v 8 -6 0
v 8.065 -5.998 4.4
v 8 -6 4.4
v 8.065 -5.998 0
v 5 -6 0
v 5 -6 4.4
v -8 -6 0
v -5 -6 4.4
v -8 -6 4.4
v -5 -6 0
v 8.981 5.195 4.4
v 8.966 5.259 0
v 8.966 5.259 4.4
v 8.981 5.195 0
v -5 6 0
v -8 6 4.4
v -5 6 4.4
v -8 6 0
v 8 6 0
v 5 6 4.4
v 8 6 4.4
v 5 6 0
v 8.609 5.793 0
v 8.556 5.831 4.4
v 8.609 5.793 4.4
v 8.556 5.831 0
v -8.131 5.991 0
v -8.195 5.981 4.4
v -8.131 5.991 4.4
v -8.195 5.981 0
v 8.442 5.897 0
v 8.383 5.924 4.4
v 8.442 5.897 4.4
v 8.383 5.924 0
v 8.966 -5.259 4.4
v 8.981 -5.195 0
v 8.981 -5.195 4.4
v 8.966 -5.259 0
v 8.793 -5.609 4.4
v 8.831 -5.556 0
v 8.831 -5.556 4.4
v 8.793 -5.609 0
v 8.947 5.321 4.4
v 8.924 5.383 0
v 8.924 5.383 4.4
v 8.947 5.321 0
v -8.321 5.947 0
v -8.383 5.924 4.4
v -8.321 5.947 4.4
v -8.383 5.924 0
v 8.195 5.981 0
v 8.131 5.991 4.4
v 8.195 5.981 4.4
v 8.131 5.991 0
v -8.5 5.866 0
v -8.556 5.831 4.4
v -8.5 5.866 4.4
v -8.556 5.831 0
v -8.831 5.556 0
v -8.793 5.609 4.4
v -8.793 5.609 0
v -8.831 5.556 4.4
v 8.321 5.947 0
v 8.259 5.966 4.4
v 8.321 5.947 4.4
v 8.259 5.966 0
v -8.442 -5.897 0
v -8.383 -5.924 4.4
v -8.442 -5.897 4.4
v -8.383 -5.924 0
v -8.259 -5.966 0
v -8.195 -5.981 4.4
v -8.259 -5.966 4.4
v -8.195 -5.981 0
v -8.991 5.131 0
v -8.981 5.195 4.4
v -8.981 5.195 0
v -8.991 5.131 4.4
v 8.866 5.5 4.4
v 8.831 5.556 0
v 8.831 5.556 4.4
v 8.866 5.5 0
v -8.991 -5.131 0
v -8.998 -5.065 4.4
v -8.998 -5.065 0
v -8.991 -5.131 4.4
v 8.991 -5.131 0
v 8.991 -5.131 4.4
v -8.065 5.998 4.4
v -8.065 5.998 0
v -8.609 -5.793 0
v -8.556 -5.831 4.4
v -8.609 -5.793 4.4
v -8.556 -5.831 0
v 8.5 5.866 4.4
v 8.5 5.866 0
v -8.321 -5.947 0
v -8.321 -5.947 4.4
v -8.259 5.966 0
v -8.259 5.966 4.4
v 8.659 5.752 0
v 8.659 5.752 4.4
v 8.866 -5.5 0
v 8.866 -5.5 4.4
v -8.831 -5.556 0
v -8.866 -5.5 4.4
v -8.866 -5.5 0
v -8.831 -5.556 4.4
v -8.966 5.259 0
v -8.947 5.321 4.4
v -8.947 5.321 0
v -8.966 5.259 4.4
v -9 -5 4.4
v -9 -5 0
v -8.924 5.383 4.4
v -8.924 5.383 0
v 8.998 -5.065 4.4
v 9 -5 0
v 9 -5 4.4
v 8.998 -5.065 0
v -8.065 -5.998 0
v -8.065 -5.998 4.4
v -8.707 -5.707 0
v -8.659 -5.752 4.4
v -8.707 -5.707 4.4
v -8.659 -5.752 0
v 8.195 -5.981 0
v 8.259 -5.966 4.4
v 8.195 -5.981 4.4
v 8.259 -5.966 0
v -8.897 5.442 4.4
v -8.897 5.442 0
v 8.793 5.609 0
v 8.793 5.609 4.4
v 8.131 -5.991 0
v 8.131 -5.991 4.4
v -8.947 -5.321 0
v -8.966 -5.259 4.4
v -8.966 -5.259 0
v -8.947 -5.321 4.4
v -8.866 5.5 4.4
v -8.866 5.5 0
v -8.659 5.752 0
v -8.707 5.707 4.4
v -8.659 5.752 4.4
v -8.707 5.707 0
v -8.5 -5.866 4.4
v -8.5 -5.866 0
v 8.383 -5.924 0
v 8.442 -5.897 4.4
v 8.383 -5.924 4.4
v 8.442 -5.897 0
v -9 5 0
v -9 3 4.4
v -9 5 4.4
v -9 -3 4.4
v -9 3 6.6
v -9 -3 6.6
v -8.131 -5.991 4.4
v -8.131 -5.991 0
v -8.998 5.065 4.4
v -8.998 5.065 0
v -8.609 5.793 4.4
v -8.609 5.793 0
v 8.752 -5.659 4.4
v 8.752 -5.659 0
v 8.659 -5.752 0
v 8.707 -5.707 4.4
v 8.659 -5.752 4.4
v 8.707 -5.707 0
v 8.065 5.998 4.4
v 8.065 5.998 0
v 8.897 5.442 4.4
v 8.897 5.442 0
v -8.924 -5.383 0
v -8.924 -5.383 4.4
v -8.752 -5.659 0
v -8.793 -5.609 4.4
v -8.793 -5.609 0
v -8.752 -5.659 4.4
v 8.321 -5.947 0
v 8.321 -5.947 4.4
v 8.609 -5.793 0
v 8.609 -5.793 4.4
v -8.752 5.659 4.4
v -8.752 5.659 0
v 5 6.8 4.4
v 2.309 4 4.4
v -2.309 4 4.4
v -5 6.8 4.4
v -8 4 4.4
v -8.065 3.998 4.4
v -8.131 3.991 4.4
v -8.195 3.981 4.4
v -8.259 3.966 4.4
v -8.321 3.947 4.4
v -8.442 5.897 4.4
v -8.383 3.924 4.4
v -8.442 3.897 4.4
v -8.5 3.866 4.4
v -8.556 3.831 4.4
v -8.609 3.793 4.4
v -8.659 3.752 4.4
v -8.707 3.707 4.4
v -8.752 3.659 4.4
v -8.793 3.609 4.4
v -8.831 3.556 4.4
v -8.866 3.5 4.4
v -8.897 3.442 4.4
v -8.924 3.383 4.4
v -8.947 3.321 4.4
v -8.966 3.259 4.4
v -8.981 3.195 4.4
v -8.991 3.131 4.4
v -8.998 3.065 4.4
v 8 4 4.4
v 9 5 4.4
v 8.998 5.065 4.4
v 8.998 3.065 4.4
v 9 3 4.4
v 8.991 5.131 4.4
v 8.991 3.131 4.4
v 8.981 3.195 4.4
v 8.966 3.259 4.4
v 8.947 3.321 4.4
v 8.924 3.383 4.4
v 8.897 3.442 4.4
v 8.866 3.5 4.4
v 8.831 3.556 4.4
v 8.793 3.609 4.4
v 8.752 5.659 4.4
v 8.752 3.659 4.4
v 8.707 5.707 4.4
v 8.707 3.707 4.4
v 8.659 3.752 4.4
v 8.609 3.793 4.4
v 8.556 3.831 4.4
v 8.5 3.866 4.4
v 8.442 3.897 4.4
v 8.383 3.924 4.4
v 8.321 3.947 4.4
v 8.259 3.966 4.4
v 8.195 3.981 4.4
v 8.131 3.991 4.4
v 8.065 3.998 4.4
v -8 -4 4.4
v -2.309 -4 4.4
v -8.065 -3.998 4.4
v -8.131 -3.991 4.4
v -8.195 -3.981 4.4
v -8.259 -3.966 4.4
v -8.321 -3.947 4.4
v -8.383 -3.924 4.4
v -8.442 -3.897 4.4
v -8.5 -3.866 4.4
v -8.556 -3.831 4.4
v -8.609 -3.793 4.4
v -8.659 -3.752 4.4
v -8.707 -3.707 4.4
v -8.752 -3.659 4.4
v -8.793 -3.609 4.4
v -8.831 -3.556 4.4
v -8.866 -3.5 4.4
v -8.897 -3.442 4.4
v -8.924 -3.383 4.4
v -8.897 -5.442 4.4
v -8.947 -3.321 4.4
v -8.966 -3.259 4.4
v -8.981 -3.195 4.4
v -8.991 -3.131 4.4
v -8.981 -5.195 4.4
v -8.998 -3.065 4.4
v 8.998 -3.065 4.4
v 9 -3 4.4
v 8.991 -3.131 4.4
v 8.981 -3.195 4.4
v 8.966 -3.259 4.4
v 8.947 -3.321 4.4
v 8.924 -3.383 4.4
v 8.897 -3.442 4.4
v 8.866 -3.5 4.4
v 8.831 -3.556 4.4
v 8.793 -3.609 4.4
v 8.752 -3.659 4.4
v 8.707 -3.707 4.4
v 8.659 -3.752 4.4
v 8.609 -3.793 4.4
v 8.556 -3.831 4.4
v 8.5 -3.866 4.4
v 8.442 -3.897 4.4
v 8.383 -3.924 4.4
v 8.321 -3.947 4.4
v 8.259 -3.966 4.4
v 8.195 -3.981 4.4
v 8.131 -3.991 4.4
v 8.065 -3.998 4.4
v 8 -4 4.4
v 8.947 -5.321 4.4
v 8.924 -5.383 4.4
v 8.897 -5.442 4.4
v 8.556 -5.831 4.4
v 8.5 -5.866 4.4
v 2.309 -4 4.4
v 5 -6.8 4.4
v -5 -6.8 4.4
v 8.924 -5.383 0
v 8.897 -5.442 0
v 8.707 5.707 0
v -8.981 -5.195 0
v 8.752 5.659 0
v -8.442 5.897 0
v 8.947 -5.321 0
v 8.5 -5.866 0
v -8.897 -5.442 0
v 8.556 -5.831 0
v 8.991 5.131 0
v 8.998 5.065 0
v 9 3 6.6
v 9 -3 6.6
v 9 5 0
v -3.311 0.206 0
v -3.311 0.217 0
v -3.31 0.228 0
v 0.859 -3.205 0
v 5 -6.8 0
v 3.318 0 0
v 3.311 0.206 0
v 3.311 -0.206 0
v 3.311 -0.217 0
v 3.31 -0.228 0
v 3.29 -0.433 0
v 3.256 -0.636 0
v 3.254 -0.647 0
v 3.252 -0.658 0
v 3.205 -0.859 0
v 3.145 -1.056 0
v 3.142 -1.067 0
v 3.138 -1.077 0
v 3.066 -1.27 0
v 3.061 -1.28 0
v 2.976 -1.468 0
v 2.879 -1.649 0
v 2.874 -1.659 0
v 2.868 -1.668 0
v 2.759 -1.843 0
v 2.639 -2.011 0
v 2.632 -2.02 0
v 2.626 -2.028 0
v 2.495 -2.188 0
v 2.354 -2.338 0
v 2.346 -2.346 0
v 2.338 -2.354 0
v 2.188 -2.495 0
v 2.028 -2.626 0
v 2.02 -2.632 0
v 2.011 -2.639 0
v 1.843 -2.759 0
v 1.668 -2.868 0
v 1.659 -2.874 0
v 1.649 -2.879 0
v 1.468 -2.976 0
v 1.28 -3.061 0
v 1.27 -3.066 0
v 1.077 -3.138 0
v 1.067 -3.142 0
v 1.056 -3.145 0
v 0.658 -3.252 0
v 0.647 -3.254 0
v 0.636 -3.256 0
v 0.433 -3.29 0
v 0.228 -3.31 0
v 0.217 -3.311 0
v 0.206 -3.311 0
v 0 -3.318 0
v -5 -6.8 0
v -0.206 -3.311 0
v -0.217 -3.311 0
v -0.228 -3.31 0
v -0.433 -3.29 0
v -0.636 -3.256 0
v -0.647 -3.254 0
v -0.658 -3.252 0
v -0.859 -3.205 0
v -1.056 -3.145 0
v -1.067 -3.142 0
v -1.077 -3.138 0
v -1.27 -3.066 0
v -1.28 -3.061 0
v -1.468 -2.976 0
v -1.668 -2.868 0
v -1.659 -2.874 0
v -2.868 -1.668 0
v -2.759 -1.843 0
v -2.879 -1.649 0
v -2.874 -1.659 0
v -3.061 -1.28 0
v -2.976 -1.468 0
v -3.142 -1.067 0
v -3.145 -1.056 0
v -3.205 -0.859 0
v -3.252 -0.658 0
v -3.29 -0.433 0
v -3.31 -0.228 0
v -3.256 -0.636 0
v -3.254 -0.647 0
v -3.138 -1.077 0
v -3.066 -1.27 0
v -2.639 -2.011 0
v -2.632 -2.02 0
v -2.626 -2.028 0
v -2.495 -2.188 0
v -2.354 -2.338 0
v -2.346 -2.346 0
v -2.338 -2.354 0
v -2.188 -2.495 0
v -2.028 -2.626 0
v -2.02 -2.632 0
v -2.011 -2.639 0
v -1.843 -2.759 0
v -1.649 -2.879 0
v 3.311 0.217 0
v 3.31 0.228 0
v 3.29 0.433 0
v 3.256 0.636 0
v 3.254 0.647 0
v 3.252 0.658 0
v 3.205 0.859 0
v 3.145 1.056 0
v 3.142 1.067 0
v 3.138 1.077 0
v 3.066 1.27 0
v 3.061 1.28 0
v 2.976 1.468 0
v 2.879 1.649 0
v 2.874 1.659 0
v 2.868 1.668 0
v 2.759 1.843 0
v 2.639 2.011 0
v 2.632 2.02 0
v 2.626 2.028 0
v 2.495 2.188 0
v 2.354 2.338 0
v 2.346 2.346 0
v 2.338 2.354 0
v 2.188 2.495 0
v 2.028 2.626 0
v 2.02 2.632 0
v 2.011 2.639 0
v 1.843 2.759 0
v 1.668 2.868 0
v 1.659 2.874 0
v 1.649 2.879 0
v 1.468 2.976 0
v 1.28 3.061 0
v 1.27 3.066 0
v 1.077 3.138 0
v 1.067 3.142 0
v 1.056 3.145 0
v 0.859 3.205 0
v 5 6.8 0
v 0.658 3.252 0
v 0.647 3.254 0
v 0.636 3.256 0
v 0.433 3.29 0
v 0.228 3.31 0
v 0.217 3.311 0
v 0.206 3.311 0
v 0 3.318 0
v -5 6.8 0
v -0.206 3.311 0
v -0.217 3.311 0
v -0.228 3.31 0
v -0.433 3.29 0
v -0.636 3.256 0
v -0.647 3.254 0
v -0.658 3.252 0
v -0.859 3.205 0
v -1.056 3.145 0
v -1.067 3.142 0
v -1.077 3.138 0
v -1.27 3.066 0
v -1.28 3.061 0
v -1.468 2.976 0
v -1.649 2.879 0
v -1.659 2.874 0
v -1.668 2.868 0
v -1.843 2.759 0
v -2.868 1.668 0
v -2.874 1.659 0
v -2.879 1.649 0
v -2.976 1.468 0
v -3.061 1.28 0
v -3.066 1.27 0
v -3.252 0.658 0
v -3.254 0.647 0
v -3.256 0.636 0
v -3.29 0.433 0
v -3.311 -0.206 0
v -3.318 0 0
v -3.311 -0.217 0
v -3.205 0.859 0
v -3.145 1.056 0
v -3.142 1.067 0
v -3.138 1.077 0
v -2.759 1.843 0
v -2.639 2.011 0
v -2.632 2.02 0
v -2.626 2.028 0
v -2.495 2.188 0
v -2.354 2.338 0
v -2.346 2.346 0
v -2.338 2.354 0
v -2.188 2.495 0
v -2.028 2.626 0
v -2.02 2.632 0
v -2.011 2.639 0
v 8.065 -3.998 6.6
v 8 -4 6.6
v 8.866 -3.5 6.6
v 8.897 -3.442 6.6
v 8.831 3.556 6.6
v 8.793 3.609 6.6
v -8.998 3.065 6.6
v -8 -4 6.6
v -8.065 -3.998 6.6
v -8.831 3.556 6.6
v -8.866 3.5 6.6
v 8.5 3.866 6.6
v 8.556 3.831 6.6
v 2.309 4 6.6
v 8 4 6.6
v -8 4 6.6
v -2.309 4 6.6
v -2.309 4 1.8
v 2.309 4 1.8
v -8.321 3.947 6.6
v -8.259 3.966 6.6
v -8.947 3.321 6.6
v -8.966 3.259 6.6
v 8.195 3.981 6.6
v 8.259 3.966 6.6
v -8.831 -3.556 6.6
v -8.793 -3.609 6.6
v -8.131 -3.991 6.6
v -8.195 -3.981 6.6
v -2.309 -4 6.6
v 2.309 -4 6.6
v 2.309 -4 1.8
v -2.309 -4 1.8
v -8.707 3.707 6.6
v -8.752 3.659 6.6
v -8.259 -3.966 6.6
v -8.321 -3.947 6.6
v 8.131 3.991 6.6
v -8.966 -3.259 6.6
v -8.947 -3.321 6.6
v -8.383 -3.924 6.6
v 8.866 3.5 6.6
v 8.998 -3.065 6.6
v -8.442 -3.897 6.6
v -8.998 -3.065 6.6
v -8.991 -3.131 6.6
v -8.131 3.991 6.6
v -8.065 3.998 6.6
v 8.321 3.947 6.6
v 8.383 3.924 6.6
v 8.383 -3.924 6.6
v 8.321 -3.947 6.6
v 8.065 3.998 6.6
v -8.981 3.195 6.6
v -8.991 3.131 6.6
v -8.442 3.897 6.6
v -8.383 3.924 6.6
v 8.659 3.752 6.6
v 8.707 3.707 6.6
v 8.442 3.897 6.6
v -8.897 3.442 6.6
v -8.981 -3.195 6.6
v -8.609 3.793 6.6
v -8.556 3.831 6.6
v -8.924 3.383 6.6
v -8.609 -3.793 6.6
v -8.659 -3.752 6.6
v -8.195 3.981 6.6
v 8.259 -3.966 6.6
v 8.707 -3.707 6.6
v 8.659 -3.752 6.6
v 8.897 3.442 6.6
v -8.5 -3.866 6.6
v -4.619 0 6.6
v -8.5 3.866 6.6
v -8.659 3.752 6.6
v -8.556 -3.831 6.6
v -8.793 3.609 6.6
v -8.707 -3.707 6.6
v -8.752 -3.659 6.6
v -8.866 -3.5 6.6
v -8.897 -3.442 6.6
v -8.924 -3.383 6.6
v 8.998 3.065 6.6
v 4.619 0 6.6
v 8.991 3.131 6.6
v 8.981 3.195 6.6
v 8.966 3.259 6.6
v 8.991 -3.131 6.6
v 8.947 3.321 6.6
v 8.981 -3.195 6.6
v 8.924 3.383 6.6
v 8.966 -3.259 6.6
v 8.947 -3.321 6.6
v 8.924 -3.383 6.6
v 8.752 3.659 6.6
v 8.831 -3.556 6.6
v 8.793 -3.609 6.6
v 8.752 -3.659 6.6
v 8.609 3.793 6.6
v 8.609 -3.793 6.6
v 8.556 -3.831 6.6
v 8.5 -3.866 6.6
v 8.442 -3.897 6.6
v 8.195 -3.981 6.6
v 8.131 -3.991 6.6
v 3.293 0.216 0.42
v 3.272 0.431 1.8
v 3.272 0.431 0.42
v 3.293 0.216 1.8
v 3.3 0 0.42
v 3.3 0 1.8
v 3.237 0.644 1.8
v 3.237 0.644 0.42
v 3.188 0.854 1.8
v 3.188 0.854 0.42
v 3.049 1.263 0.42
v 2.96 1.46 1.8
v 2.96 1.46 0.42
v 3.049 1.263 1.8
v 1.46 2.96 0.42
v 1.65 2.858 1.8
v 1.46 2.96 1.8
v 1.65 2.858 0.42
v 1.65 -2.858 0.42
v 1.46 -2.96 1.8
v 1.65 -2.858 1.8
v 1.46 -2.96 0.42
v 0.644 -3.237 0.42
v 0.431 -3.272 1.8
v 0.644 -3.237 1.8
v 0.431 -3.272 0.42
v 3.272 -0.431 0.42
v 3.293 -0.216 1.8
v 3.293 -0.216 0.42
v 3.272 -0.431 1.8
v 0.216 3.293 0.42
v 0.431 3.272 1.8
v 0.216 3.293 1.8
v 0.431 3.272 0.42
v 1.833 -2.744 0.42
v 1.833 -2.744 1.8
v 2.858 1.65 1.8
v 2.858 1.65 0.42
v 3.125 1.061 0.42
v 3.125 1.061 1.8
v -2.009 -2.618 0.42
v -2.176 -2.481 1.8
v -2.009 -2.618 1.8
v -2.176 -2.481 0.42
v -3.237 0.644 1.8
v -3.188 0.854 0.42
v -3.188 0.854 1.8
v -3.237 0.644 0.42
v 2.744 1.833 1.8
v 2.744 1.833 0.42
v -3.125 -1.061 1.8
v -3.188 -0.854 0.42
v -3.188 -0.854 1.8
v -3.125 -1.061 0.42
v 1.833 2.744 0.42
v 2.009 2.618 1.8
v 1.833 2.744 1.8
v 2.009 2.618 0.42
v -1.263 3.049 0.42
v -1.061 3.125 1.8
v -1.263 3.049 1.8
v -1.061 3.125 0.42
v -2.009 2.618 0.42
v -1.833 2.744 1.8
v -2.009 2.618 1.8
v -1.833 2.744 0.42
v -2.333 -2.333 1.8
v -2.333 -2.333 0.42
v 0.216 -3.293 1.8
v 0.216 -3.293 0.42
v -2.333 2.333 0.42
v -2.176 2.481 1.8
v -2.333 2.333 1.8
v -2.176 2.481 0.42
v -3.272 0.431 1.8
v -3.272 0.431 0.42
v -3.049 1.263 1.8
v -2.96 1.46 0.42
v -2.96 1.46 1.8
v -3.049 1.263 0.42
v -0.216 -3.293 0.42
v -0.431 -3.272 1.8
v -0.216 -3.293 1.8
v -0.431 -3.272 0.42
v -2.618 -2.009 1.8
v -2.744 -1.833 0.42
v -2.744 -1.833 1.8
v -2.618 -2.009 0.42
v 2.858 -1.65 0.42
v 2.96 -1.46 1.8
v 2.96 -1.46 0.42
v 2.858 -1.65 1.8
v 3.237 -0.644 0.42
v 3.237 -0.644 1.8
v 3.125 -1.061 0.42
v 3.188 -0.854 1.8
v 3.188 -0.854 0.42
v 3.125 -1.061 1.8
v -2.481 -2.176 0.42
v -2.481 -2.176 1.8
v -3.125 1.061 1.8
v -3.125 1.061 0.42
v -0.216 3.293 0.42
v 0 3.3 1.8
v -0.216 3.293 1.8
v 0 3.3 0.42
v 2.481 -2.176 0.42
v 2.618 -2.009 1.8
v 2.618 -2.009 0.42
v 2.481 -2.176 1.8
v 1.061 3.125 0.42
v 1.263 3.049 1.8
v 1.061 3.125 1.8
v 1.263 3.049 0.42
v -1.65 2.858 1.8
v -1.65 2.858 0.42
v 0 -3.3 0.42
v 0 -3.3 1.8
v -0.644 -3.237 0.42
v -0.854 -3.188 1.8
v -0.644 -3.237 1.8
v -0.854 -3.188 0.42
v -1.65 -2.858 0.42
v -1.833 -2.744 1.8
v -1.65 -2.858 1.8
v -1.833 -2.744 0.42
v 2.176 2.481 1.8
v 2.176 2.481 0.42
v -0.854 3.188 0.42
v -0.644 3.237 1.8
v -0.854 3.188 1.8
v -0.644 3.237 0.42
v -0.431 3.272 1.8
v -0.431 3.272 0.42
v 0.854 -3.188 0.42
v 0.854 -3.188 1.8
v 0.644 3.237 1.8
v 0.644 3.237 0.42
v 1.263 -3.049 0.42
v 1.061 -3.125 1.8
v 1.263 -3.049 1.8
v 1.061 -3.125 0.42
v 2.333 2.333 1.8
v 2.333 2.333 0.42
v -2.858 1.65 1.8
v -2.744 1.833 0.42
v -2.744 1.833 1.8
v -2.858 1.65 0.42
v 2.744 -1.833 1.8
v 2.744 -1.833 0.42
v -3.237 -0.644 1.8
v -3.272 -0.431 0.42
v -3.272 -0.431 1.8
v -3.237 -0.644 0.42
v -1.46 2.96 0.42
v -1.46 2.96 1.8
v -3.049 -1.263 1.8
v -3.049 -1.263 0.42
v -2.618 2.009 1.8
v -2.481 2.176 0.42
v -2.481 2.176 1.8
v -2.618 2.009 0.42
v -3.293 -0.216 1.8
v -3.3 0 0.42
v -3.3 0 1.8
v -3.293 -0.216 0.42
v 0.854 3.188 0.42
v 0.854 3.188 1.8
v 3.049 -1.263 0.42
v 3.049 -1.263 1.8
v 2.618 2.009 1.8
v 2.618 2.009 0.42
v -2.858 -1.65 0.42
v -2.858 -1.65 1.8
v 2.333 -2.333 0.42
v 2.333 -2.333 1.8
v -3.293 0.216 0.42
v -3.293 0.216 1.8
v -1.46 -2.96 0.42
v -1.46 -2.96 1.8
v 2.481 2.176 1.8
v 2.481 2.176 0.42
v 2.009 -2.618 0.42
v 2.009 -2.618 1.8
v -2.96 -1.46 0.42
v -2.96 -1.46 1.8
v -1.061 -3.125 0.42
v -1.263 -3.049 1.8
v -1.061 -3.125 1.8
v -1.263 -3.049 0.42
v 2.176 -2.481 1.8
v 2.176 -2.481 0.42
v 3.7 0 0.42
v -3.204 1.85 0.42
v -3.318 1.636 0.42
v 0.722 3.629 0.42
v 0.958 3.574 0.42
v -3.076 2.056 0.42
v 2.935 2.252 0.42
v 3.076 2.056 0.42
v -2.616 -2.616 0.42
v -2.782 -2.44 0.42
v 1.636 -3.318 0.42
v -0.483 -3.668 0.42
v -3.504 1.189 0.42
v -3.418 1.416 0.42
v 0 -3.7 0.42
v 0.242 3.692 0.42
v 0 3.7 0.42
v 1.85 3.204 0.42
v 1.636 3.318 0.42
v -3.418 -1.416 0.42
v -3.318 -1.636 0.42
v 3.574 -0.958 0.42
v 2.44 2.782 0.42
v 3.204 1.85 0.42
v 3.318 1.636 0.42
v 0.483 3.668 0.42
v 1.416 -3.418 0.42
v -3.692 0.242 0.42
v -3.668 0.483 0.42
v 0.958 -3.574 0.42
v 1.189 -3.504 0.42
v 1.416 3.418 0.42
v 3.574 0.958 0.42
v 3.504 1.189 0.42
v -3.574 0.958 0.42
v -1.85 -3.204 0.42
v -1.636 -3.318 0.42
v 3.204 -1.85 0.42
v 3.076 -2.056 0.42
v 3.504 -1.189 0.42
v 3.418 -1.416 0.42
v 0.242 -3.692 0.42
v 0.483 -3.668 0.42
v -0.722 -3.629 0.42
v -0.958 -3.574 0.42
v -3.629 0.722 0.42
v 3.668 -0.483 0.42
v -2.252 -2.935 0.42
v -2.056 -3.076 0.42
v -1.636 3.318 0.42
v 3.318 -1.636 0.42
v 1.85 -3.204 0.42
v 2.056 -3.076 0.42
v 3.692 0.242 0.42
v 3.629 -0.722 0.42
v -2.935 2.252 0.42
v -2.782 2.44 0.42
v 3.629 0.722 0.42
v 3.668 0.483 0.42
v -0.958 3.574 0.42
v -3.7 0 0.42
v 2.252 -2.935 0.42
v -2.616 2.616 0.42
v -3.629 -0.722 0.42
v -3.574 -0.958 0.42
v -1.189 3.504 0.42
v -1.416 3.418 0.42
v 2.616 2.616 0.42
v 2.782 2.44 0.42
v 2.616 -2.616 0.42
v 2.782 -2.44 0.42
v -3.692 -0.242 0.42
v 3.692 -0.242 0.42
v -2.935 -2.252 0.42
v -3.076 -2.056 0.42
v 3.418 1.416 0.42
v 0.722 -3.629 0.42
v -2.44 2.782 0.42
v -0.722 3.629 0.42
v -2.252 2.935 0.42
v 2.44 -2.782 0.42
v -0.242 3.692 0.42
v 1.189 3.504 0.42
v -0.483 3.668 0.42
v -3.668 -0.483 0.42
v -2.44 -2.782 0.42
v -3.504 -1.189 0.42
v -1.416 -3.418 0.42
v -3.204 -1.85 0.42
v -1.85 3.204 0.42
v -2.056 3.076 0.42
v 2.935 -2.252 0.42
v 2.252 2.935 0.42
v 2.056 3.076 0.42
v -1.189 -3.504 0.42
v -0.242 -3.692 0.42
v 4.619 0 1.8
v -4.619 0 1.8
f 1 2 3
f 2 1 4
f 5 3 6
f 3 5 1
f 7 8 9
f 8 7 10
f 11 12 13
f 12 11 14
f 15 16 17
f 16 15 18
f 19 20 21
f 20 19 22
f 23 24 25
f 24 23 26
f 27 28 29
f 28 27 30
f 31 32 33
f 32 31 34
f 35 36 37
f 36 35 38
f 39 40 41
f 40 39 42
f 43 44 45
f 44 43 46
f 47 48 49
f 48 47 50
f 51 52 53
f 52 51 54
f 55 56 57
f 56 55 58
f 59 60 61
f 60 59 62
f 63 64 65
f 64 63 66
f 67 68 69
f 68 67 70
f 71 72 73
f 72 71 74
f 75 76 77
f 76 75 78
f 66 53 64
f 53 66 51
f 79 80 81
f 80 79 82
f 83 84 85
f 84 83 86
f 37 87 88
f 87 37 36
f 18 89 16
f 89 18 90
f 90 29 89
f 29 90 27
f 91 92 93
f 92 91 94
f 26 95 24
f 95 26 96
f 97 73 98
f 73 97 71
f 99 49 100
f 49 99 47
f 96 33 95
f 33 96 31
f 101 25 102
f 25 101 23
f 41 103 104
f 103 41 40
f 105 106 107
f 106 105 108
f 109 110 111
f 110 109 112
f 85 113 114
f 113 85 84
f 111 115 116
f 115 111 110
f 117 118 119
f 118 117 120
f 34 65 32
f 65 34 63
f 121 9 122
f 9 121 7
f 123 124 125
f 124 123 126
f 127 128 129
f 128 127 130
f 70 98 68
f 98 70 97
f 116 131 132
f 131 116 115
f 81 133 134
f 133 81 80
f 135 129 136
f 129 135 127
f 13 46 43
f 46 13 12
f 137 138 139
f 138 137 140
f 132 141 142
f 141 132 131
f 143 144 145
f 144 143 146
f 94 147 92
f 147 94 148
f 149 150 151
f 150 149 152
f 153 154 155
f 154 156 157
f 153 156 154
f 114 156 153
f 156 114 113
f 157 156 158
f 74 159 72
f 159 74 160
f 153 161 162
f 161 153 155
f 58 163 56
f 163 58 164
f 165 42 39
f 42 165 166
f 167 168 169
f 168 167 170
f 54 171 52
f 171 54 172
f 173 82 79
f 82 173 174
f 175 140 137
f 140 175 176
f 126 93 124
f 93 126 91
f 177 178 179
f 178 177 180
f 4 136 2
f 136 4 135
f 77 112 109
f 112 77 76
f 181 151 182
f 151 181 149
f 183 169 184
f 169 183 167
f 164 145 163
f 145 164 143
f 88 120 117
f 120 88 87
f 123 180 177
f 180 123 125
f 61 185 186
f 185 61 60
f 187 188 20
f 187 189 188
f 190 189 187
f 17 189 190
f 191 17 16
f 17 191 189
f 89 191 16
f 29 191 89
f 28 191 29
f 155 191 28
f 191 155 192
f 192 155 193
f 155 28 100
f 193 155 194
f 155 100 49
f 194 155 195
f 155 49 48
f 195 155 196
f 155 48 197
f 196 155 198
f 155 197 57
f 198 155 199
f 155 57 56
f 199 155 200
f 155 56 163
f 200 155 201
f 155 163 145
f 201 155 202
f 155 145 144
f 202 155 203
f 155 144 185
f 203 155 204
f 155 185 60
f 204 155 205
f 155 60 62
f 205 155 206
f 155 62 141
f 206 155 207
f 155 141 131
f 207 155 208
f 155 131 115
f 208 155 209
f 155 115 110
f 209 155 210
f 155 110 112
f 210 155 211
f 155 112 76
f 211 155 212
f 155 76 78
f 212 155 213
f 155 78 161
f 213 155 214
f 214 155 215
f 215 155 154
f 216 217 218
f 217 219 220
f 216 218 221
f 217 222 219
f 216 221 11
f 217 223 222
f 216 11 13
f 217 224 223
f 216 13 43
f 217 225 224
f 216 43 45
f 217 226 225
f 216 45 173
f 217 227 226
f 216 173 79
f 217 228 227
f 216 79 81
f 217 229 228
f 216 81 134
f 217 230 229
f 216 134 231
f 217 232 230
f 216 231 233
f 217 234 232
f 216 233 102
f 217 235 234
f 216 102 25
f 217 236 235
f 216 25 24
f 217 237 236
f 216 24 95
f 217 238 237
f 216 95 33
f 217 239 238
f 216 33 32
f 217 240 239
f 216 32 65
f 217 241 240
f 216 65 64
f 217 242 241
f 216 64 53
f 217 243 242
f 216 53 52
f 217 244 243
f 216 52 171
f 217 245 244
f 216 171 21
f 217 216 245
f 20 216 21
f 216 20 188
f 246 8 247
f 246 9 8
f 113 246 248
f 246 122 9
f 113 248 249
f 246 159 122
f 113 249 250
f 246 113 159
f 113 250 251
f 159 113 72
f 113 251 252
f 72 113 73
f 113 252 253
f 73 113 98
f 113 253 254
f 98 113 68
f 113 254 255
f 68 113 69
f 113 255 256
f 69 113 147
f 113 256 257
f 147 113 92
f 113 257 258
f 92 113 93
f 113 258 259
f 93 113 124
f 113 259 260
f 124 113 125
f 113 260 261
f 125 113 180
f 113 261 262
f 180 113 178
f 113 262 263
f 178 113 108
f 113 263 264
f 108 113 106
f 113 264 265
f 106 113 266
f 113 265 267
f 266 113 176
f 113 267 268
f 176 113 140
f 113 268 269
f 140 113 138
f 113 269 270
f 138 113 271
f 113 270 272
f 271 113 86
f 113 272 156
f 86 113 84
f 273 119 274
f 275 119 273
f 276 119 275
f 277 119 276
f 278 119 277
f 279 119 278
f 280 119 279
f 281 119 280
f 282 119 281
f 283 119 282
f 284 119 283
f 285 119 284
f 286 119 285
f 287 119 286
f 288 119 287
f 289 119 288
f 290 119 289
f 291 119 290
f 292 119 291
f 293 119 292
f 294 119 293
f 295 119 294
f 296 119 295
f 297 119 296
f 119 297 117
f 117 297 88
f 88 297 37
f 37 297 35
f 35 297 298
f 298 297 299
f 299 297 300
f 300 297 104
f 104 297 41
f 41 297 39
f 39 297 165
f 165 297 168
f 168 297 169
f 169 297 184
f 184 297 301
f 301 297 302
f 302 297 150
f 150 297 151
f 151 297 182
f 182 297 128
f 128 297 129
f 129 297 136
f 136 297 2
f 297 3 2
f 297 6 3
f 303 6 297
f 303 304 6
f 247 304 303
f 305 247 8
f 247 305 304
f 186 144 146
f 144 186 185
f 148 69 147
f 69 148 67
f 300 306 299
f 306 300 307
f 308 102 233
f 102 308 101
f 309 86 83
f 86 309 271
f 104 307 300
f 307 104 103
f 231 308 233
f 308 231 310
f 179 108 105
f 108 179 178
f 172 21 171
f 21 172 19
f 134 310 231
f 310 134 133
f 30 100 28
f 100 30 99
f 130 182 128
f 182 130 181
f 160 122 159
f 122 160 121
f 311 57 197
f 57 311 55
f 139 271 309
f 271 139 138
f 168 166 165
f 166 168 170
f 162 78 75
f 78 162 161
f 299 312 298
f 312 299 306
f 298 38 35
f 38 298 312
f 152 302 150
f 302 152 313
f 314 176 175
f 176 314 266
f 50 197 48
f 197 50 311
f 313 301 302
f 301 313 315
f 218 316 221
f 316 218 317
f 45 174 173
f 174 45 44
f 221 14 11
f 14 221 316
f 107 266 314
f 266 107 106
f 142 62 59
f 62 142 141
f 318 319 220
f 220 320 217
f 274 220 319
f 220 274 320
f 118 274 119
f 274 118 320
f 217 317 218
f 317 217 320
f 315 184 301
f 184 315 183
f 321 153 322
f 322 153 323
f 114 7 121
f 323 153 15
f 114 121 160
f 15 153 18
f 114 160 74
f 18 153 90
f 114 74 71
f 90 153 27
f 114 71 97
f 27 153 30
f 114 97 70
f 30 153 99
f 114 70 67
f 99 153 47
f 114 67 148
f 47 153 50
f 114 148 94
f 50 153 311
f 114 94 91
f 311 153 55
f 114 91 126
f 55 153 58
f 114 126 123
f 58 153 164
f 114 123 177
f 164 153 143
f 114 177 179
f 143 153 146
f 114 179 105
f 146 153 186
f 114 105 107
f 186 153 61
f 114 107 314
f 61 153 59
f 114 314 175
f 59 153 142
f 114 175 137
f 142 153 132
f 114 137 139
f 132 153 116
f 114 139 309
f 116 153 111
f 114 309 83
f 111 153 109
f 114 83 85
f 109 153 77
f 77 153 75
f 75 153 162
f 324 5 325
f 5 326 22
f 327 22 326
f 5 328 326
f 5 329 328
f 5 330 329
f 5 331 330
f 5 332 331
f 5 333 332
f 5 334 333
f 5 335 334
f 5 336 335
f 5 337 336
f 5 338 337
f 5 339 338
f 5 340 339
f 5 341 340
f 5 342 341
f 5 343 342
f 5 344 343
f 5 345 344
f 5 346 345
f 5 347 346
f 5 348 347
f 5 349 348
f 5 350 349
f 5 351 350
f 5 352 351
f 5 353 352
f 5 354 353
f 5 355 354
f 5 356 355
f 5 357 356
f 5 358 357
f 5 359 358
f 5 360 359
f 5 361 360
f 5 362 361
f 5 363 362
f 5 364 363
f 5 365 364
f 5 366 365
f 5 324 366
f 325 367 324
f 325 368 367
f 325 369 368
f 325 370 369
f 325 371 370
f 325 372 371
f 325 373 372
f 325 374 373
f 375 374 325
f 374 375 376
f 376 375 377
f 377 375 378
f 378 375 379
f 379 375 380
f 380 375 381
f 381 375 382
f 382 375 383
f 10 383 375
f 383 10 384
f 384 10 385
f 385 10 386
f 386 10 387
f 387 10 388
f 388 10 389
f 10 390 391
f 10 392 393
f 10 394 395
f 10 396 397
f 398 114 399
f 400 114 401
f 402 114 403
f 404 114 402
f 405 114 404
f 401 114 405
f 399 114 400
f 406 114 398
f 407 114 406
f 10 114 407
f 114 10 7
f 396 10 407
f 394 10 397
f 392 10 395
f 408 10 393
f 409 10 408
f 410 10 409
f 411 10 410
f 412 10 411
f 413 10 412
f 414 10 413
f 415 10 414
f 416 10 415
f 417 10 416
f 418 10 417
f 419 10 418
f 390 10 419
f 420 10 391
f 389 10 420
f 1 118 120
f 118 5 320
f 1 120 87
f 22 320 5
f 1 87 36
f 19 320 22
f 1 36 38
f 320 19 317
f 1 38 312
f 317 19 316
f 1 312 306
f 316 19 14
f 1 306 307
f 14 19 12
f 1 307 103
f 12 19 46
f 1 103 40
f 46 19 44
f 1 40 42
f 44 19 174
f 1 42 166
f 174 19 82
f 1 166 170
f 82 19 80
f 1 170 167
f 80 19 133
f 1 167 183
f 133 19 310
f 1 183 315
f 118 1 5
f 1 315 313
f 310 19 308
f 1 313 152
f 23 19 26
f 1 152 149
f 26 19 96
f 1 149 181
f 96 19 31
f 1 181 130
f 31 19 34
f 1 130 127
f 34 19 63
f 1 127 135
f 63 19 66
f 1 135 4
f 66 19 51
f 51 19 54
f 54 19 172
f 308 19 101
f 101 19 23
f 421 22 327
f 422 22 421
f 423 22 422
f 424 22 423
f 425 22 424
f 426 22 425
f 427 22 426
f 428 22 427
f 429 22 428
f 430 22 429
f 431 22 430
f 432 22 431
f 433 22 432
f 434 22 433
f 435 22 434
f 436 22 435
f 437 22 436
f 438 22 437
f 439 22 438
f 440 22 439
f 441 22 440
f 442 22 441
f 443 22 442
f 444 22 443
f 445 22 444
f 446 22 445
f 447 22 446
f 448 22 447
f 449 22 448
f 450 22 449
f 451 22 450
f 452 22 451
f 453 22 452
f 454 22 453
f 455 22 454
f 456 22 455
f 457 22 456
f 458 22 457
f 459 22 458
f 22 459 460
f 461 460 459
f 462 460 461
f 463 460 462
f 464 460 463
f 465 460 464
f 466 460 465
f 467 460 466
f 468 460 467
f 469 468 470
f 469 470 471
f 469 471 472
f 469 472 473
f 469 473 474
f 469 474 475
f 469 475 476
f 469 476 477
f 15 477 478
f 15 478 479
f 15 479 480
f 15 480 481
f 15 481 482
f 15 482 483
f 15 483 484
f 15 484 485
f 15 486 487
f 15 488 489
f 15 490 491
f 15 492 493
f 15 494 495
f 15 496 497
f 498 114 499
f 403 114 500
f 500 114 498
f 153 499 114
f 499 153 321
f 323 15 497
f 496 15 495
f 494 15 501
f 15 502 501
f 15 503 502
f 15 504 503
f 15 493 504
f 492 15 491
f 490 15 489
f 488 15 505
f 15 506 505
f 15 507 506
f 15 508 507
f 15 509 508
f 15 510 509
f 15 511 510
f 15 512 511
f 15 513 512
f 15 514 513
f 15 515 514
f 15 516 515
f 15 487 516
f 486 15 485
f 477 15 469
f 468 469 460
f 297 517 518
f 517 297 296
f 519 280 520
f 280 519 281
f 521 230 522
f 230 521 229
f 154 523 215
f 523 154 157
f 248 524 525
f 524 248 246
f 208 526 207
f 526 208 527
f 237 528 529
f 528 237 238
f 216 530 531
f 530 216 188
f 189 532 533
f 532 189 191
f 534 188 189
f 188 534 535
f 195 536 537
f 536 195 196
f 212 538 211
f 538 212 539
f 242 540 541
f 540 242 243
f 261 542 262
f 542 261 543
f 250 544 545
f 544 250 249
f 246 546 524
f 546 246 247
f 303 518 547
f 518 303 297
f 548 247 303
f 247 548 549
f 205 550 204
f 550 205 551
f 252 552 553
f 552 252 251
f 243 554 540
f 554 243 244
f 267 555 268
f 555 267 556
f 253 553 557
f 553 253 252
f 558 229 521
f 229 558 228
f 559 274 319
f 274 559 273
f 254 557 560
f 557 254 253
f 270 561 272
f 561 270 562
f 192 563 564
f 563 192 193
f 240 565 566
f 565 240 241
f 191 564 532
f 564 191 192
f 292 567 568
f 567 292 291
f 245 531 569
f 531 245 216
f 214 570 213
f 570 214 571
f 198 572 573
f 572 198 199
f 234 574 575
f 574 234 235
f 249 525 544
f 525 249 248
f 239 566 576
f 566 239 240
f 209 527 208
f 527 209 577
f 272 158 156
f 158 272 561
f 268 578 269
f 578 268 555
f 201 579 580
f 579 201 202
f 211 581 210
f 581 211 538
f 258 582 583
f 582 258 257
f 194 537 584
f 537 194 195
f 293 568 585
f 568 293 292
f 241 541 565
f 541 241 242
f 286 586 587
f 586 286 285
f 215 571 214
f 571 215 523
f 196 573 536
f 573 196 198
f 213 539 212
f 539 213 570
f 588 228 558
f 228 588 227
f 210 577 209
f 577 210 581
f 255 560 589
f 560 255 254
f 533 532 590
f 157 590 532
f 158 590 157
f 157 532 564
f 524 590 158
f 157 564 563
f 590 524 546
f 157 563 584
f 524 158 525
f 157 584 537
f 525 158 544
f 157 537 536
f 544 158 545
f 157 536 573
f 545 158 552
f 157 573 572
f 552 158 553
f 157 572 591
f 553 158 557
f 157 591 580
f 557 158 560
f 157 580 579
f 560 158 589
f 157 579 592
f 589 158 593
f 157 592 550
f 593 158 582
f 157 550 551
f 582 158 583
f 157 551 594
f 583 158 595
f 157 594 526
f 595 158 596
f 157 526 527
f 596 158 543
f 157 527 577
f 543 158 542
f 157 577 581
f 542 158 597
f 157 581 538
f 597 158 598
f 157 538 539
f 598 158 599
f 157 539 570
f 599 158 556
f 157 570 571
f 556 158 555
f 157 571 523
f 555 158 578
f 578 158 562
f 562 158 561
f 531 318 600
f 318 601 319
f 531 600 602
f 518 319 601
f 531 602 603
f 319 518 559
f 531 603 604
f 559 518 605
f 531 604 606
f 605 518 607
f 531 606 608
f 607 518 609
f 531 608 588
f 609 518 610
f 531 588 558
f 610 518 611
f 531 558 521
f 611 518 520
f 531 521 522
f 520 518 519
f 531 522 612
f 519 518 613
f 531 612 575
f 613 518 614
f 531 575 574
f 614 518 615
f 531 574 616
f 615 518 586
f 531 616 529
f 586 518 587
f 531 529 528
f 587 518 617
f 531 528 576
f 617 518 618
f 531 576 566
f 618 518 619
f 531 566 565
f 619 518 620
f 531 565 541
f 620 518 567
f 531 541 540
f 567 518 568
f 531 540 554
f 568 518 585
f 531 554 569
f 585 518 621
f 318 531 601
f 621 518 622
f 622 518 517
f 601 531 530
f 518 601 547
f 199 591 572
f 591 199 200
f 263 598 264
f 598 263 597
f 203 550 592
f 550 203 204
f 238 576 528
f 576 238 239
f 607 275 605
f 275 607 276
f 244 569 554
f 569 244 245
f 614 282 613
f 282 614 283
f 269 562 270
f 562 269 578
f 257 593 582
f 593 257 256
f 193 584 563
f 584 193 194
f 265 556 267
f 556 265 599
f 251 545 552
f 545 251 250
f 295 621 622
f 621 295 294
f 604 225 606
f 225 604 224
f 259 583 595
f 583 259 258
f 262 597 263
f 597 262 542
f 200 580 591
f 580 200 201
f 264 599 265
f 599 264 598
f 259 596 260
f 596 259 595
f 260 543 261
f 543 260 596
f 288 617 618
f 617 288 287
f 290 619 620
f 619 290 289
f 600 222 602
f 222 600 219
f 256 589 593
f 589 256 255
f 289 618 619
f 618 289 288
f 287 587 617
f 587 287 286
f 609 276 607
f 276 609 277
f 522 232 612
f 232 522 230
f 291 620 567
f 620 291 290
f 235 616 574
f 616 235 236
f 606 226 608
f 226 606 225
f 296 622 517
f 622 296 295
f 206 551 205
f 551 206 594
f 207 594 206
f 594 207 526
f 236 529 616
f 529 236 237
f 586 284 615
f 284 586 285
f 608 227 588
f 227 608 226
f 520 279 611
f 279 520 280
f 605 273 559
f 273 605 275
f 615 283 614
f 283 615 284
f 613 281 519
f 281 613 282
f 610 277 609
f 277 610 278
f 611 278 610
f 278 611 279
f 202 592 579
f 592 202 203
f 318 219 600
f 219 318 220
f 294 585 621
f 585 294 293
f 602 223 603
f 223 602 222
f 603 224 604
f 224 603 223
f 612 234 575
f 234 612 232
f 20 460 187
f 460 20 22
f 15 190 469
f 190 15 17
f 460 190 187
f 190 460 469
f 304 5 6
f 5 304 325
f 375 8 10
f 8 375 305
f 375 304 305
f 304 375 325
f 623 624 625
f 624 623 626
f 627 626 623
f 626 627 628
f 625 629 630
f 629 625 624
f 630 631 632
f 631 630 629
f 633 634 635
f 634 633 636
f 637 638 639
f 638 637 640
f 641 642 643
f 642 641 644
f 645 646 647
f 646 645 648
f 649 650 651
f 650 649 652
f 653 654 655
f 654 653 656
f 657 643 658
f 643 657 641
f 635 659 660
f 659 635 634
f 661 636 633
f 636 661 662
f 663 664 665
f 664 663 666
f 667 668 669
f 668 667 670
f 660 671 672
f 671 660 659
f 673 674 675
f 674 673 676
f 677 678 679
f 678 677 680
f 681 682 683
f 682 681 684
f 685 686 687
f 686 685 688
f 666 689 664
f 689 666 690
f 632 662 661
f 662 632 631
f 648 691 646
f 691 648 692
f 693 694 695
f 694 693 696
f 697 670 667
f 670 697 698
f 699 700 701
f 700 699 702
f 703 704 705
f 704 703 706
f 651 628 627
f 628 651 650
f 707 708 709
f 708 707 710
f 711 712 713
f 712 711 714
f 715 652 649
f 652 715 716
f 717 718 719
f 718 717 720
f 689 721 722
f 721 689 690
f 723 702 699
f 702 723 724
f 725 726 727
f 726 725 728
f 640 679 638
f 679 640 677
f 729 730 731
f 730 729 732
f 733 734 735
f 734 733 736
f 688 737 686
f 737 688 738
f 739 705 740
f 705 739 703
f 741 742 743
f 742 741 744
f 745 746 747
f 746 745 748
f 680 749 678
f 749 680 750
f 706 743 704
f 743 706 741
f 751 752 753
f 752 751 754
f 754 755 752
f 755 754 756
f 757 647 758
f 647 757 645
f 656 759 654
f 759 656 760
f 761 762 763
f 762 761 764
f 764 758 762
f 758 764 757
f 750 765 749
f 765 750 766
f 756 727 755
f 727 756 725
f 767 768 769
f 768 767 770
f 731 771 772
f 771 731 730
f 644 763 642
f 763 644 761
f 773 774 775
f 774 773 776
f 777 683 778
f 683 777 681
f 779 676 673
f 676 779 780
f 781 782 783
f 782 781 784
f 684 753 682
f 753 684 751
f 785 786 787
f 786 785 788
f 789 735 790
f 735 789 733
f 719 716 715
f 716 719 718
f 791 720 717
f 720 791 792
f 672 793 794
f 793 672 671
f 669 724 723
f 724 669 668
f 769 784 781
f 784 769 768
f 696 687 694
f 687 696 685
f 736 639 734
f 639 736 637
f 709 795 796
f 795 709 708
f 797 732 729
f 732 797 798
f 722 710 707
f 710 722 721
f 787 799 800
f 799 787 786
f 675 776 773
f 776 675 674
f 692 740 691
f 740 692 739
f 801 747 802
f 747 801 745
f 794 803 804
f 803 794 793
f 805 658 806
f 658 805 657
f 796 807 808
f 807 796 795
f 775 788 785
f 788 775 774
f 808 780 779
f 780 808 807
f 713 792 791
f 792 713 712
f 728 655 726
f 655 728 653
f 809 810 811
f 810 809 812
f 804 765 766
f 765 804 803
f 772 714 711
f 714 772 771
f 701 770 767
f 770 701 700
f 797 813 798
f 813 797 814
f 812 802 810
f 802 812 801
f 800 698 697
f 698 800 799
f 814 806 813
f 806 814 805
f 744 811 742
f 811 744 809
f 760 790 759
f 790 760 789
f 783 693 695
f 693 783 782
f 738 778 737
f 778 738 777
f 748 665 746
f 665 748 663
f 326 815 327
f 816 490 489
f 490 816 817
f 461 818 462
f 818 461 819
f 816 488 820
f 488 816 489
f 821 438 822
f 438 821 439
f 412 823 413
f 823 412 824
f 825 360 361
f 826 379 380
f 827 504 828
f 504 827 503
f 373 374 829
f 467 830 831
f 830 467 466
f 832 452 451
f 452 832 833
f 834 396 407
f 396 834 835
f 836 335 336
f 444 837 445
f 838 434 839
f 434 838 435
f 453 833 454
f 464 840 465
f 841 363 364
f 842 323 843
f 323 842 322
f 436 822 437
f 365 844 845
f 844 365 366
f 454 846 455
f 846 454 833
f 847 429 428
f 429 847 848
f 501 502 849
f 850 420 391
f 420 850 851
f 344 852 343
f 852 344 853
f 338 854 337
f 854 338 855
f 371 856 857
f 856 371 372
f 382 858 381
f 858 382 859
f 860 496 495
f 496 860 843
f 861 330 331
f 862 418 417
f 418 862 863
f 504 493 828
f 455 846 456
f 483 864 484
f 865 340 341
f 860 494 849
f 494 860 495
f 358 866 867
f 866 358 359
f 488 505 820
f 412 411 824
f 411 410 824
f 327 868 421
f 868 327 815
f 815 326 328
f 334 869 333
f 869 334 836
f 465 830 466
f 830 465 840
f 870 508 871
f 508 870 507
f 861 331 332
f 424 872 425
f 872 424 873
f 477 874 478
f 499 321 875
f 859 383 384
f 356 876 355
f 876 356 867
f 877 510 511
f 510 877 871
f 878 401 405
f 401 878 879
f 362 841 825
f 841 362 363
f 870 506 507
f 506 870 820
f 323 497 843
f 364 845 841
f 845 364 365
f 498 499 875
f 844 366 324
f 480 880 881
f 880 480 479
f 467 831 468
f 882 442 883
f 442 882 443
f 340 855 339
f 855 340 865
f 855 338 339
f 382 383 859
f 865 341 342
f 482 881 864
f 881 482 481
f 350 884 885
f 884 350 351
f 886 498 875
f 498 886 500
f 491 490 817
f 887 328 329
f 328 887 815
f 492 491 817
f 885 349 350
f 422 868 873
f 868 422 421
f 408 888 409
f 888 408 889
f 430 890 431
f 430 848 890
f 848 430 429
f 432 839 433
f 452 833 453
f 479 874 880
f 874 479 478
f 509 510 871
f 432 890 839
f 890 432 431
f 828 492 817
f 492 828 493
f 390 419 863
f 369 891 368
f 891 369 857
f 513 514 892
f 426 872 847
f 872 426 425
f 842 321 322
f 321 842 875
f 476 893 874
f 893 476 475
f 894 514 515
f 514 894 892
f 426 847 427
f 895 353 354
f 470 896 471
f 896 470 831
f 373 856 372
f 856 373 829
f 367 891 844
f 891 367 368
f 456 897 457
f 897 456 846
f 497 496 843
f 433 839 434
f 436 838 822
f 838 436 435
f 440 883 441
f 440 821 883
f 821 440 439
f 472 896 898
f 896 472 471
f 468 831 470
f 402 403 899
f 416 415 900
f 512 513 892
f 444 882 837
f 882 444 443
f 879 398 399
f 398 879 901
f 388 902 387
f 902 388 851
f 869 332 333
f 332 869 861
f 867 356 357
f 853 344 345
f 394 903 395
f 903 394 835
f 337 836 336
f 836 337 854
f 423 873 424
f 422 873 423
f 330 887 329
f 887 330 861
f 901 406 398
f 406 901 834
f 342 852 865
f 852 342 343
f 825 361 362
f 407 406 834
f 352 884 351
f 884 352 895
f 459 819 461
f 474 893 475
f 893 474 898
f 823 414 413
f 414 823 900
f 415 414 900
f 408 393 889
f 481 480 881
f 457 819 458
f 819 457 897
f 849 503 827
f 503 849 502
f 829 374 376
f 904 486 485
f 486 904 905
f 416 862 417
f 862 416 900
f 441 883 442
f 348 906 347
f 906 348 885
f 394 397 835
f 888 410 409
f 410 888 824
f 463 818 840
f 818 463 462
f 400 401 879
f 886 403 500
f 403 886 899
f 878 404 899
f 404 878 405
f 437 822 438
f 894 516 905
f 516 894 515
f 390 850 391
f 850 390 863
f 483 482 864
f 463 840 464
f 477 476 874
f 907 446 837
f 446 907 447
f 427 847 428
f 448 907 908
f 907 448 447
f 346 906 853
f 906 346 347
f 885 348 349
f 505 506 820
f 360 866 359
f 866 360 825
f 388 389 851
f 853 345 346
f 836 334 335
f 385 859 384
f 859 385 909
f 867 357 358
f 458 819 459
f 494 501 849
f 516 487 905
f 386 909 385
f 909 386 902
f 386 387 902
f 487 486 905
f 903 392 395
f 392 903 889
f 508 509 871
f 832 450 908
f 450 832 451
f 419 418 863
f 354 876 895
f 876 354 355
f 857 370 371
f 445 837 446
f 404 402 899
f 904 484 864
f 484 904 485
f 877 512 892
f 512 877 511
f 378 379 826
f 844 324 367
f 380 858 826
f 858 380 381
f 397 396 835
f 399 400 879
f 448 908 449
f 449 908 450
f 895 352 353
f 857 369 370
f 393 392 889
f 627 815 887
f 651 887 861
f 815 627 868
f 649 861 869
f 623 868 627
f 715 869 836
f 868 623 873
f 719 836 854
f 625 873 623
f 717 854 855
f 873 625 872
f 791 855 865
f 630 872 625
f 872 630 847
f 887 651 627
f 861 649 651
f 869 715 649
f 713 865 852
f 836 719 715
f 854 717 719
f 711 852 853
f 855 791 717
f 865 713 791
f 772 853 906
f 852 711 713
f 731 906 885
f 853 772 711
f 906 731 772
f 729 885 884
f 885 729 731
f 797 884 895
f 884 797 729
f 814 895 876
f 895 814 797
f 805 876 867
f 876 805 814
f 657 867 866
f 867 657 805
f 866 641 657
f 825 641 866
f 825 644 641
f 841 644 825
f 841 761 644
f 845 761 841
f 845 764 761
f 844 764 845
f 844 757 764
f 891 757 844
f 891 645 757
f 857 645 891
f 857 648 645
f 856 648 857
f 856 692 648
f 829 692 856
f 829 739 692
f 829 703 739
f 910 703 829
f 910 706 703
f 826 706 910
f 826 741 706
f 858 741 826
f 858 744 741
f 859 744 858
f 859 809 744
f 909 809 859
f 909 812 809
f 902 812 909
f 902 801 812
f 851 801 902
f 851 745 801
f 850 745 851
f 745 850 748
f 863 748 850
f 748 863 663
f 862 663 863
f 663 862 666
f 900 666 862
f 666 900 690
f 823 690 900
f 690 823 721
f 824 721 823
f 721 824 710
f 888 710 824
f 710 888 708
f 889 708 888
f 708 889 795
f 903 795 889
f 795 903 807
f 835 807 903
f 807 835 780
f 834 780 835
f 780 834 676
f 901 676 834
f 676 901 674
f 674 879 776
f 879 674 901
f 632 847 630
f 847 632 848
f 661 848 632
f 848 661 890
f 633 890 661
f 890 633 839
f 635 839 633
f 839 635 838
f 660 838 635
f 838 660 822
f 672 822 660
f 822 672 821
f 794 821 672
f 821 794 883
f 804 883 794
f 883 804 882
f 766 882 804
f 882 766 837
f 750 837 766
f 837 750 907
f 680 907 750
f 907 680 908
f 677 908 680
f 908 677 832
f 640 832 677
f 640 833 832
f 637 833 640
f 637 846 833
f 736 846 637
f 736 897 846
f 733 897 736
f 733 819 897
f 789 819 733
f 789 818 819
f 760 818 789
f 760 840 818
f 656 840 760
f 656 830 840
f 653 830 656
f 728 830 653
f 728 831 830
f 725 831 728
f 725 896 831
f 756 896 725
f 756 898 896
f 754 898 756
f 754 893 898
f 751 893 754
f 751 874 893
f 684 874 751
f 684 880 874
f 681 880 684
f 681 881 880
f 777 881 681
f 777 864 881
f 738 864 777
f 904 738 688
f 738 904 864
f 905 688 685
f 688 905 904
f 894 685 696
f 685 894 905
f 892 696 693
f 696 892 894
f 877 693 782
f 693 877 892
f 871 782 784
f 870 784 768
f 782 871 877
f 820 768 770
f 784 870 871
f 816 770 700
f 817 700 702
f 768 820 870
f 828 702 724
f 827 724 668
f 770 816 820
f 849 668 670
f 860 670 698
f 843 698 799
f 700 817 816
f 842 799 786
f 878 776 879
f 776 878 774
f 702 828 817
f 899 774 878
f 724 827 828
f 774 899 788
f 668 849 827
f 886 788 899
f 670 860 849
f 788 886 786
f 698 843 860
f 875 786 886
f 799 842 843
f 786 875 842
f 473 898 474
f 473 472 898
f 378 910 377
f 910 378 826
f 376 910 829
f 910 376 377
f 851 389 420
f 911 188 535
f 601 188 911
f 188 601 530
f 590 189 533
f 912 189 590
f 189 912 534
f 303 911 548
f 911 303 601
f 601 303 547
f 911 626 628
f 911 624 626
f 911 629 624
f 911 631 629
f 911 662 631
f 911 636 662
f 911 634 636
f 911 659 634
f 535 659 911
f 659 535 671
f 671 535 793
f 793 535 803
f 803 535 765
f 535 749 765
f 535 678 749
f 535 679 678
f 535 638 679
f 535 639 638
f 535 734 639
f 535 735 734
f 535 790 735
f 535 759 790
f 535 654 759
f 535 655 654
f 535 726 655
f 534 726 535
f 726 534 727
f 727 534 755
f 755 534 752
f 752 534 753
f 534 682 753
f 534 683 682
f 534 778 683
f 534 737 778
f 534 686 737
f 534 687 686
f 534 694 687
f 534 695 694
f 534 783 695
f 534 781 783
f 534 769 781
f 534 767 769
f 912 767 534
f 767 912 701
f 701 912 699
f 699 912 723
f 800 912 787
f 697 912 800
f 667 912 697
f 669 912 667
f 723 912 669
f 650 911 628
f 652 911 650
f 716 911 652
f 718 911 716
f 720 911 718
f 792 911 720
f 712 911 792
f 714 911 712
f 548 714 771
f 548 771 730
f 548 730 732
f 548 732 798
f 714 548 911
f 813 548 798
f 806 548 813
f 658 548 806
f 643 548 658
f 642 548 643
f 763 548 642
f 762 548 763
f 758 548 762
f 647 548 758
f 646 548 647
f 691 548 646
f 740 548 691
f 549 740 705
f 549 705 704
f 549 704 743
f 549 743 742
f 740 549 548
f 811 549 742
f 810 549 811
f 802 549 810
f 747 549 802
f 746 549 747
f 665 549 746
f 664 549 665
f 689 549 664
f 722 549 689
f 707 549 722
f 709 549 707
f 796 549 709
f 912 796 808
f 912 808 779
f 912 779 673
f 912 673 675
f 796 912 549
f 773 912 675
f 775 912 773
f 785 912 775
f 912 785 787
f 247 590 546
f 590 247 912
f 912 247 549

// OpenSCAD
$fn = 96;

// Required dimensions (mm)
screw_d = 6.0;          // nominal screw size (reference)
clear_d = 6.6;          // clearance hole for M6
af      = 8.0;          // across flats (hex)
th      = 6.6;          // total thickness

// T-slot nut body (parametric defaults; adjust to your extrusion slot)
body_len = 18.0;
body_w   = 12.0;
corner_r = 1.0;

// T-slot step/undercut (creates the "T" profile)
step_h = 2.2;           // height of the narrower top section
step_w = 8.0;           // width of the narrower top section (<= body_w)
step_len = body_len;    // keep same length for a simple T-nut

// Anti-rotation nibs (small side ribs on the wider base)
nib_w   = 10.0;         // along length
nib_t   = 0.8;          // protrusion thickness (outward)
nib_h   = th - step_h;  // only on the lower (wider) portion

// Chamfers around the through-hole
top_chamfer    = 0.6;
bottom_chamfer = 0.4;

// Hex pocket depth (nut capture) from top face
hex_depth = 4.8;

// Small overlap to ensure watertight unions/differences
eps = 0.02;

// Helper: rounded rectangle prism (Z from 0..h)
module rounded_rect_prism(l, w, h, r){
    r2 = min(r, min(l,w)/2);
    linear_extrude(height=h)
        offset(r=r2)
            square([l-2*r2, w-2*r2], center=true);
}

// Helper: hex prism by across-flats (Z from 0..h)
module hex_prism_af(af, h){
    // across-flats = sqrt(3) * R (circumradius)
    R = af / sqrt(3);
    linear_extrude(height=h)
        polygon([ for(i=[0:5]) [ R*cos(60*i), R*sin(60*i) ] ]);
}

difference(){
    union(){
        // Lower (wider) base: Z = 0 .. (th - step_h)
        rounded_rect_prism(body_len, body_w, th - step_h, corner_r);

        // Upper (narrower) step: Z = (th - step_h) .. th
        translate([0,0,th - step_h - eps])
            rounded_rect_prism(step_len, step_w, step_h + eps, corner_r);

        // Anti-rotation nibs on the lower base only (connected, no floating)
        translate([0,  body_w/2 + nib_t/2 - eps, (th - step_h)/2])
            cube([nib_w, nib_t + 2*eps, nib_h], center=true);
        translate([0, -body_w/2 - nib_t/2 + eps, (th - step_h)/2])
            cube([nib_w, nib_t + 2*eps, nib_h], center=true);
    }

    // Through clearance hole (goes fully through)
    translate([0,0,-eps])
        cylinder(d=clear_d, h=th + 2*eps);

    // Top chamfer around hole
    translate([0,0,th - top_chamfer])
        cylinder(d1=clear_d + 2*top_chamfer, d2=clear_d, h=top_chamfer + eps);

    // Bottom chamfer around hole
    translate([0,0,-eps])
        cylinder(d1=clear_d, d2=clear_d + 2*bottom_chamfer, h=bottom_chamfer + 2*eps);

    // Hex pocket on top for 8mm across flats (visible in top view)
    translate([0,0,th - hex_depth])
        hex_prism_af(af, hex_depth + eps);
}
